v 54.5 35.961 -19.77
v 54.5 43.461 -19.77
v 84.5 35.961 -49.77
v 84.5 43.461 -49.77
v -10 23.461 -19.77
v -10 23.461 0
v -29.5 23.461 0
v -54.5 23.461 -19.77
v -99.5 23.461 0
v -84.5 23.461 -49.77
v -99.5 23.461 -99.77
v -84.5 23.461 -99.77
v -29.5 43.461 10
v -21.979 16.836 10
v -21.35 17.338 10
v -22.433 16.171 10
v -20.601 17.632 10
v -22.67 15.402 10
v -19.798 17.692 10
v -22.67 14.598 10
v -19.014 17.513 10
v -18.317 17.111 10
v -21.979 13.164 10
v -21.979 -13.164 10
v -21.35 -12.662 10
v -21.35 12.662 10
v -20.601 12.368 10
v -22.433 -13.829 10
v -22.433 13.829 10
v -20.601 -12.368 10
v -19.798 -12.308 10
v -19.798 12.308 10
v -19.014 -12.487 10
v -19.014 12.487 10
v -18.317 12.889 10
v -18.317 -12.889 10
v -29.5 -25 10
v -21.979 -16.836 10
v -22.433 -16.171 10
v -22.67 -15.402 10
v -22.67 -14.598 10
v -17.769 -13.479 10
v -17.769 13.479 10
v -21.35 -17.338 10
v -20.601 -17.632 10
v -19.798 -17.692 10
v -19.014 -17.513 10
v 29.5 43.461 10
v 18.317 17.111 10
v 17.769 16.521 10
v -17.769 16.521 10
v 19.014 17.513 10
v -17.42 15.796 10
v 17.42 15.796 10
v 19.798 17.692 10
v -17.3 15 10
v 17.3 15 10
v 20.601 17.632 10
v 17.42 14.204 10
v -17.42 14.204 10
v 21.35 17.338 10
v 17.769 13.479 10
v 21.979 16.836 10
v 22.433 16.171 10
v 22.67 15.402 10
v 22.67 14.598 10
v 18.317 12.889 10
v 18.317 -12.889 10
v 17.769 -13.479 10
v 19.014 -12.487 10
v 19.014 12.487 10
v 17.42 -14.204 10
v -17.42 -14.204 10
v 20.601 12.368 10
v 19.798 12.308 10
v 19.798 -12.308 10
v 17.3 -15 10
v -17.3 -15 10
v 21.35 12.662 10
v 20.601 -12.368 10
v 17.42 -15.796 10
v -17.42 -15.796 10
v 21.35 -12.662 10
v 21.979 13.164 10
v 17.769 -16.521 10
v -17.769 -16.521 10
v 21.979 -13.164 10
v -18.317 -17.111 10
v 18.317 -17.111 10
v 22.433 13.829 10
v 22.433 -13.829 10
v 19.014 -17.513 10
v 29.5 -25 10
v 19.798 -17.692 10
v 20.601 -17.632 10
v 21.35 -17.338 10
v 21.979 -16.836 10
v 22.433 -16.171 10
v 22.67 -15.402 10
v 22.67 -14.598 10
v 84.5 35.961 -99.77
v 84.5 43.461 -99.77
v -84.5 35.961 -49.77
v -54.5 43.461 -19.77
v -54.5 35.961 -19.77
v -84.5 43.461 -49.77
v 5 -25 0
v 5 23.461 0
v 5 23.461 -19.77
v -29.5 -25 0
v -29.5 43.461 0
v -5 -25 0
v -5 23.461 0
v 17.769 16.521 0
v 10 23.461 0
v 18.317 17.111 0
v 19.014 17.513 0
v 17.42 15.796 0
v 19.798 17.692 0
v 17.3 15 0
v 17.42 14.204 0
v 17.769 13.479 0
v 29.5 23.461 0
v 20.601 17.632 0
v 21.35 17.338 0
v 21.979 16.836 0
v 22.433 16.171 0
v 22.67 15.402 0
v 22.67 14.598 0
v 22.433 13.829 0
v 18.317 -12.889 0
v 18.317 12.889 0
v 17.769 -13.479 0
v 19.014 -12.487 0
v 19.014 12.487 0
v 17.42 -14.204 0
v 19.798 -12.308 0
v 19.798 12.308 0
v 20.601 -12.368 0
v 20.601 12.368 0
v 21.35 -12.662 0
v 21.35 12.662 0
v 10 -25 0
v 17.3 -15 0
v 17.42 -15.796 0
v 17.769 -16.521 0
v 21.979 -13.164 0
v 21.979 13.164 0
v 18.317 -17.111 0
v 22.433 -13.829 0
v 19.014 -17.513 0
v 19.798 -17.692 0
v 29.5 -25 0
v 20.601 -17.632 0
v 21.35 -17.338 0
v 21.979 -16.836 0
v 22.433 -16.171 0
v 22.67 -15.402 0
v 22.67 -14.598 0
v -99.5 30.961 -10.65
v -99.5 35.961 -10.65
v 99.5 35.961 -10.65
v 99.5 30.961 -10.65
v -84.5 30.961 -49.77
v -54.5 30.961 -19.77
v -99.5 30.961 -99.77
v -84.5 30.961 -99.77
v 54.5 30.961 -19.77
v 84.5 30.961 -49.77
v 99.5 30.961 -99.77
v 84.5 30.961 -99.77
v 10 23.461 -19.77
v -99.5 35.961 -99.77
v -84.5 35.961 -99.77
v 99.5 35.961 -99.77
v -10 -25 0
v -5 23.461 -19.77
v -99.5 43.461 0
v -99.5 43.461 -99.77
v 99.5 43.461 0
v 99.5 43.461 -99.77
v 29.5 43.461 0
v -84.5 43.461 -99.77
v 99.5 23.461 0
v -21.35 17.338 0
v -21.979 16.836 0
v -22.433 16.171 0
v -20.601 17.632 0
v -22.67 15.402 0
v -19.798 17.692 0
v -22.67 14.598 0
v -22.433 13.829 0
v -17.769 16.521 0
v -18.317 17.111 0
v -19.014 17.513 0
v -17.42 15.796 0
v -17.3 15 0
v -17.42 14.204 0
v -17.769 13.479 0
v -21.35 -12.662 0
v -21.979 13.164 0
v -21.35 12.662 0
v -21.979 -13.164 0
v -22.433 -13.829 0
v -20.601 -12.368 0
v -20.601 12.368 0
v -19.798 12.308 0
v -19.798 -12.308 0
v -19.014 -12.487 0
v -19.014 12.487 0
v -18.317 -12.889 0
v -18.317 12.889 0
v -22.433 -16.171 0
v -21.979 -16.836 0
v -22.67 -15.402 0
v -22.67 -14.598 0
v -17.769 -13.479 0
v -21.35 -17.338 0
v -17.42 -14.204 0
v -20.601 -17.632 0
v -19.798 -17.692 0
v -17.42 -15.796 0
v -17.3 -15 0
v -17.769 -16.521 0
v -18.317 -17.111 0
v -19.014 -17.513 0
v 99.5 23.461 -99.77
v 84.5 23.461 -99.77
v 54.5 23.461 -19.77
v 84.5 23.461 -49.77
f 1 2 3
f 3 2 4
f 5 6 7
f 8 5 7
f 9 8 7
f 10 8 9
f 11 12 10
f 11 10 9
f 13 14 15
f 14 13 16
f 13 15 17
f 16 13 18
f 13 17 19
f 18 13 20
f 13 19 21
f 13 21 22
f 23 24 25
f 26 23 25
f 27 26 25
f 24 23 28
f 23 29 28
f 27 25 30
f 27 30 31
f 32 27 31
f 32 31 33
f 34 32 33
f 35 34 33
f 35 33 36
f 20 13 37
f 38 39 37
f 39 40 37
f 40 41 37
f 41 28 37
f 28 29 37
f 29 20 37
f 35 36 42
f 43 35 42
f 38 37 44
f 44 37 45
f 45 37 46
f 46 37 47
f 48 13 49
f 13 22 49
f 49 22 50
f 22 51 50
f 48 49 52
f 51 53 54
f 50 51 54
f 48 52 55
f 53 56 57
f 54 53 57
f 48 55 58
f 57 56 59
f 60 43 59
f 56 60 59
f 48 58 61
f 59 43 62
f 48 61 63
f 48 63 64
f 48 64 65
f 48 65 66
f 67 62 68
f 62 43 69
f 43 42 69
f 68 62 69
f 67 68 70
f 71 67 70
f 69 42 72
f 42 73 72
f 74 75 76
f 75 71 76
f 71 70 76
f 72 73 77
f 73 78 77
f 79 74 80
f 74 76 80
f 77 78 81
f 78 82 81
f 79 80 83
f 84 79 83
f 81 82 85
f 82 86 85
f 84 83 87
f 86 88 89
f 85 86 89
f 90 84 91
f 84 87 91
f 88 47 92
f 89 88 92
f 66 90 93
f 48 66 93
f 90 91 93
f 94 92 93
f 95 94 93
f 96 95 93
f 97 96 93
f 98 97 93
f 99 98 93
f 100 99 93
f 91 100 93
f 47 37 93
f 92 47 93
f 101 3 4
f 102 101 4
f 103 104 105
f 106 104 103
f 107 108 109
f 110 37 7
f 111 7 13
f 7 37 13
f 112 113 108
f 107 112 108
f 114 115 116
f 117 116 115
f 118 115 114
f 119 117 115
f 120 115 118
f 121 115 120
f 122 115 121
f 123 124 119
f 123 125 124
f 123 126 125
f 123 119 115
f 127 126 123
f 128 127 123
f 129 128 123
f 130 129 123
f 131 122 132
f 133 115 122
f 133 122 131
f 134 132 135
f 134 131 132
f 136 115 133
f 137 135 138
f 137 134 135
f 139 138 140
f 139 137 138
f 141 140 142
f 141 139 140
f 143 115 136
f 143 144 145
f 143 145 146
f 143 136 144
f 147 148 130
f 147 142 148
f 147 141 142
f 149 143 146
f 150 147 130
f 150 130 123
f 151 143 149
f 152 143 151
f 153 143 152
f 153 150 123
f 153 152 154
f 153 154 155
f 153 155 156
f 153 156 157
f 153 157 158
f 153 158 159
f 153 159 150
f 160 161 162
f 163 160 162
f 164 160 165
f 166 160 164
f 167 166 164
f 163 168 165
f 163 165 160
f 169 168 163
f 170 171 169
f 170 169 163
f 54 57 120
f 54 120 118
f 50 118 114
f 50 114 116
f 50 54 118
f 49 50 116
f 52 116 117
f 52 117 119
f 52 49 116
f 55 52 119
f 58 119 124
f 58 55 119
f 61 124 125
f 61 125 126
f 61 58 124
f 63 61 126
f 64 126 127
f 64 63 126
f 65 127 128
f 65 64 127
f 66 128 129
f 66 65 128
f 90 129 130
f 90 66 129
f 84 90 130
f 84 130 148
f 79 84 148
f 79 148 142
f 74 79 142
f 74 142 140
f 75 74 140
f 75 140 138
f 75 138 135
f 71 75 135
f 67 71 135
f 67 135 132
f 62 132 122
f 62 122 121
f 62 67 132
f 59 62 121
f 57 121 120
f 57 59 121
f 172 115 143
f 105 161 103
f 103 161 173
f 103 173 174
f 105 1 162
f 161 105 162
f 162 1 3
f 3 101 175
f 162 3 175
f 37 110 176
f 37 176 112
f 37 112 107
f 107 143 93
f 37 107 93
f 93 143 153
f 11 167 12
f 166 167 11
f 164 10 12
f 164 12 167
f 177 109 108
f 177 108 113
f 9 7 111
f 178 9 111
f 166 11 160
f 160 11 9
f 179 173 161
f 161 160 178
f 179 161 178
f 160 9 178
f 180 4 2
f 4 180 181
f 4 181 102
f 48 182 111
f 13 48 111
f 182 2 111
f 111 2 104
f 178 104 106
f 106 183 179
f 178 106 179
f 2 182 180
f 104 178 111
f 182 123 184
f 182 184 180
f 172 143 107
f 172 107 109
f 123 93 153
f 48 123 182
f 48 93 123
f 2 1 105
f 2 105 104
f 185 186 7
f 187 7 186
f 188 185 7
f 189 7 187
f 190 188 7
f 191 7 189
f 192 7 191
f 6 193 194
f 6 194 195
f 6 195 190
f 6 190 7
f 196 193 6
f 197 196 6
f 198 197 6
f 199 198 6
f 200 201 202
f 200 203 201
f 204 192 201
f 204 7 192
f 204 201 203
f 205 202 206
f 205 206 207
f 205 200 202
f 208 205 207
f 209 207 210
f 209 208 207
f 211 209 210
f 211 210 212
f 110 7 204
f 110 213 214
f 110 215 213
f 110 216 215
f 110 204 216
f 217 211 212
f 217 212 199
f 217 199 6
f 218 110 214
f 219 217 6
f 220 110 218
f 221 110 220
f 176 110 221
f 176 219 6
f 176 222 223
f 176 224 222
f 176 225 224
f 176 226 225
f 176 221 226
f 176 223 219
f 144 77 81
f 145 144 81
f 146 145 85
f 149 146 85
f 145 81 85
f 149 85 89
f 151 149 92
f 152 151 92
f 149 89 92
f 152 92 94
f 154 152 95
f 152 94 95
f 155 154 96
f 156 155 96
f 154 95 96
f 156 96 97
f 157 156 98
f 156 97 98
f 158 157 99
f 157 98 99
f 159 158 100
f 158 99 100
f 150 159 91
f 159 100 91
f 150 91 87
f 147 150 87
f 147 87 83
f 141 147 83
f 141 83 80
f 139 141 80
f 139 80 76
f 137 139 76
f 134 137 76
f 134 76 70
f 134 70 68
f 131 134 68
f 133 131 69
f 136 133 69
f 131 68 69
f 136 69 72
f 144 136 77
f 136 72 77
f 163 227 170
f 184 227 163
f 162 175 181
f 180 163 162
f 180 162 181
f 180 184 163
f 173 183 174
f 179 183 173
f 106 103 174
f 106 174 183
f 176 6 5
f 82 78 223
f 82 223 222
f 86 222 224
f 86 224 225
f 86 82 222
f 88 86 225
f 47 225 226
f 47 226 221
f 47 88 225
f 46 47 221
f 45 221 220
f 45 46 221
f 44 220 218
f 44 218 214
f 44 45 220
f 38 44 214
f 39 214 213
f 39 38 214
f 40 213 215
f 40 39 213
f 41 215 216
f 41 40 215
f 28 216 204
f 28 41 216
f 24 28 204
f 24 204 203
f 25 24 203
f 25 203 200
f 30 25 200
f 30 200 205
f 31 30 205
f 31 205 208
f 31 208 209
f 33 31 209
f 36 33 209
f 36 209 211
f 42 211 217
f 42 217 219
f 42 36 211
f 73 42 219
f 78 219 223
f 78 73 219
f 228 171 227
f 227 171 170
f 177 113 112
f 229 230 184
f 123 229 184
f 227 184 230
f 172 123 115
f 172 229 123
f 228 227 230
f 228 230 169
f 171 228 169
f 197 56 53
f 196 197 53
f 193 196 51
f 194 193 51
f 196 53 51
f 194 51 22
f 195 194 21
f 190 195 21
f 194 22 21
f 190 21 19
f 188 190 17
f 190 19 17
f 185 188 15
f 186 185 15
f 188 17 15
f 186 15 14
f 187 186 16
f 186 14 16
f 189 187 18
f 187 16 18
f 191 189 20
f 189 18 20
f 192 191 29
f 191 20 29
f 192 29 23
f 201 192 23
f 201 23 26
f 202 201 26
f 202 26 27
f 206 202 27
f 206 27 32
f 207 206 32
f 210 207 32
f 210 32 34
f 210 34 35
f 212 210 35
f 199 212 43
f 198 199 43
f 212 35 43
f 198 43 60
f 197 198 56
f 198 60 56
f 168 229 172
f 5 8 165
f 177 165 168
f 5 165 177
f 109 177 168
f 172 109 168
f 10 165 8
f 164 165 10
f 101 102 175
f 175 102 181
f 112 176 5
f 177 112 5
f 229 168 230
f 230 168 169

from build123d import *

# Parameters (mm, degrees)
SKETCH1_W                                  = 59
SKETCH1_H                                  = 50
BOSS_EXTRUDE1_DEPTH                        = 10
SKETCH2_R                                  = 2.7
CUT_EXTRUDE1_DEPTH                         = 10
MIRROR1_AT_THE_SECOND_PLANE_COPY_1_SKETC_R = 2.7
MIRROR1_AT_THE_SECOND_PLANE_COPY_1_DEPTH   = 10
SKETCH9_W                                  = 59
SKETCH9_H                                  = 10
BOSS_EXTRUDE10_DEPTH                       = 18.461375068
SKETCH12_W                                 = 59
SKETCH12_H                                 = 20
BOSS_EXTRUDE11_DEPTH                       = 19.770139482
SKETCH13_W                                 = 19.770139482
SKETCH13_H                                 = 20
BOSS_EXTRUDE12_DEPTH                       = 70
SKETCH14_W                                 = 15
SKETCH14_H                                 = 20
BOSS_EXTRUDE13_DEPTH                       = 80
BOSS_EXTRUDE14_DEPTH                       = 20
BOSS_EXTRUDE15_DEPTH                       = 5
SKETCH16_W                                 = 199
SKETCH16_H                                 = 5
CUT_EXTRUDE3_DEPTH                         = 109.350147663


with BuildPart() as part:
    # Sketch1 → Boss-Extrude1 (new body)
    with BuildSketch(Plane.XY):
        Rectangle(SKETCH1_W, SKETCH1_H)
    extrude(amount=BOSS_EXTRUDE1_DEPTH)

    # Sketch2 → Cut-Extrude1 (cut)
    with BuildSketch(Plane.XY.offset(10)):
        with Locations((-20, 15)):
            Circle(SKETCH2_R)
    cut_extrude1 = extrude(amount=-CUT_EXTRUDE1_DEPTH, mode=Mode.SUBTRACT)

    # Mirror1: Cut-Extrude1 across plane
    add(cut_extrude1.mirror(Plane.ZX), mode=Mode.SUBTRACT)

    # Mirror1 at the second plane: Cut-Extrude1 across plane
    add(cut_extrude1.mirror(Plane(origin=(0, 0, 0), x_dir=(0, 0, 1), z_dir=(1, 0, 0))), mode=Mode.SUBTRACT)

    # Mirror1 at the second plane copy 1 sketc → Mirror1 at the second plane copy 1 (cut)
    with BuildSketch(Plane(origin=(0, 0, 10), x_dir=(-1, 0, 0), z_dir=(0, 0, 1))):
        with Locations((-20, 15)):
            Circle(MIRROR1_AT_THE_SECOND_PLANE_COPY_1_SKETC_R)
    extrude(amount=-MIRROR1_AT_THE_SECOND_PLANE_COPY_1_DEPTH, mode=Mode.SUBTRACT)

    # Sketch9 → Boss-Extrude10 (add)
    with BuildSketch(Plane(origin=(0, 25, 0), x_dir=(1, 0, 0), z_dir=(0, 1, 0))):
        with Locations((0, -5)):
            Rectangle(SKETCH9_W, SKETCH9_H)
    extrude(amount=BOSS_EXTRUDE10_DEPTH)

    # Sketch12 → Boss-Extrude11 (add)
    with BuildSketch(Plane(origin=(0, 0, 0), x_dir=(-1, 0, 0), z_dir=(0, 0, -1))):
        with Locations((0, 33.461375068)):
            Rectangle(SKETCH12_W, SKETCH12_H)
    extrude(amount=BOSS_EXTRUDE11_DEPTH)

    # Sketch13 → Boss-Extrude12 (add)
    with BuildSketch(Plane.ZY.offset(29.5)):
        with Locations((-9.885069741, 33.461375068)):
            Rectangle(SKETCH13_W, SKETCH13_H)
    boss_extrude12 = extrude(amount=BOSS_EXTRUDE12_DEPTH)

    # Sketch14 → Boss-Extrude13 (add)
    with BuildSketch(Plane(origin=(0, 0, -19.770139482), x_dir=(-1, 0, 0), z_dir=(0, 0, -1))):
        with Locations((92, 33.461375068)):
            Rectangle(SKETCH14_W, SKETCH14_H)
    boss_extrude13 = extrude(amount=BOSS_EXTRUDE13_DEPTH)

    # Mirror2: Boss-Extrude12, Boss-Extrude13 across plane
    add(boss_extrude12.mirror(Plane(origin=(0, 0, 0), x_dir=(0, 0, 1), z_dir=(1, 0, 0))))
    add(boss_extrude13.mirror(Plane(origin=(0, 0, 0), x_dir=(0, 0, 1), z_dir=(1, 0, 0))))

    # Sketch15 → Boss-Extrude14 (add)
    with BuildSketch(Plane(origin=(0, 43.461375068, 0), x_dir=(1, 0, 0), z_dir=(0, 1, 0))):
        Polygon((-84.5, 19.770139482), (-54.5, 19.770139482), (-84.5, 49.770139482), align=None)
    boss_extrude14 = extrude(amount=-BOSS_EXTRUDE14_DEPTH)

    # Mirror3: Boss-Extrude14 across plane
    add(boss_extrude14.mirror(Plane(origin=(0, 0, 0), x_dir=(0, 0, 1), z_dir=(1, 0, 0))))

    # Sketch19 → Boss-Extrude15 (add)
    with BuildSketch(Plane(origin=(10, 0, 0), x_dir=(0, 0, -1), z_dir=(1, 0, 0))):
        Polygon((0, -25), (19.770139482, 23.461375068), (0, 23.461375068), align=None)
    boss_extrude15 = extrude(amount=-BOSS_EXTRUDE15_DEPTH)

    # Mirror4: Boss-Extrude15 across plane
    add(boss_extrude15.mirror(Plane(origin=(0, 0, 0), x_dir=(0, 0, 1), z_dir=(1, 0, 0))))

    # Sketch16 → Cut-Extrude3 (cut)
    with BuildSketch(Plane.XY.offset(-120)):
        with Locations((0, 33.461375068)):
            Rectangle(SKETCH16_W, SKETCH16_H)
    extrude(amount=CUT_EXTRUDE3_DEPTH, mode=Mode.SUBTRACT)


solid = part.part
